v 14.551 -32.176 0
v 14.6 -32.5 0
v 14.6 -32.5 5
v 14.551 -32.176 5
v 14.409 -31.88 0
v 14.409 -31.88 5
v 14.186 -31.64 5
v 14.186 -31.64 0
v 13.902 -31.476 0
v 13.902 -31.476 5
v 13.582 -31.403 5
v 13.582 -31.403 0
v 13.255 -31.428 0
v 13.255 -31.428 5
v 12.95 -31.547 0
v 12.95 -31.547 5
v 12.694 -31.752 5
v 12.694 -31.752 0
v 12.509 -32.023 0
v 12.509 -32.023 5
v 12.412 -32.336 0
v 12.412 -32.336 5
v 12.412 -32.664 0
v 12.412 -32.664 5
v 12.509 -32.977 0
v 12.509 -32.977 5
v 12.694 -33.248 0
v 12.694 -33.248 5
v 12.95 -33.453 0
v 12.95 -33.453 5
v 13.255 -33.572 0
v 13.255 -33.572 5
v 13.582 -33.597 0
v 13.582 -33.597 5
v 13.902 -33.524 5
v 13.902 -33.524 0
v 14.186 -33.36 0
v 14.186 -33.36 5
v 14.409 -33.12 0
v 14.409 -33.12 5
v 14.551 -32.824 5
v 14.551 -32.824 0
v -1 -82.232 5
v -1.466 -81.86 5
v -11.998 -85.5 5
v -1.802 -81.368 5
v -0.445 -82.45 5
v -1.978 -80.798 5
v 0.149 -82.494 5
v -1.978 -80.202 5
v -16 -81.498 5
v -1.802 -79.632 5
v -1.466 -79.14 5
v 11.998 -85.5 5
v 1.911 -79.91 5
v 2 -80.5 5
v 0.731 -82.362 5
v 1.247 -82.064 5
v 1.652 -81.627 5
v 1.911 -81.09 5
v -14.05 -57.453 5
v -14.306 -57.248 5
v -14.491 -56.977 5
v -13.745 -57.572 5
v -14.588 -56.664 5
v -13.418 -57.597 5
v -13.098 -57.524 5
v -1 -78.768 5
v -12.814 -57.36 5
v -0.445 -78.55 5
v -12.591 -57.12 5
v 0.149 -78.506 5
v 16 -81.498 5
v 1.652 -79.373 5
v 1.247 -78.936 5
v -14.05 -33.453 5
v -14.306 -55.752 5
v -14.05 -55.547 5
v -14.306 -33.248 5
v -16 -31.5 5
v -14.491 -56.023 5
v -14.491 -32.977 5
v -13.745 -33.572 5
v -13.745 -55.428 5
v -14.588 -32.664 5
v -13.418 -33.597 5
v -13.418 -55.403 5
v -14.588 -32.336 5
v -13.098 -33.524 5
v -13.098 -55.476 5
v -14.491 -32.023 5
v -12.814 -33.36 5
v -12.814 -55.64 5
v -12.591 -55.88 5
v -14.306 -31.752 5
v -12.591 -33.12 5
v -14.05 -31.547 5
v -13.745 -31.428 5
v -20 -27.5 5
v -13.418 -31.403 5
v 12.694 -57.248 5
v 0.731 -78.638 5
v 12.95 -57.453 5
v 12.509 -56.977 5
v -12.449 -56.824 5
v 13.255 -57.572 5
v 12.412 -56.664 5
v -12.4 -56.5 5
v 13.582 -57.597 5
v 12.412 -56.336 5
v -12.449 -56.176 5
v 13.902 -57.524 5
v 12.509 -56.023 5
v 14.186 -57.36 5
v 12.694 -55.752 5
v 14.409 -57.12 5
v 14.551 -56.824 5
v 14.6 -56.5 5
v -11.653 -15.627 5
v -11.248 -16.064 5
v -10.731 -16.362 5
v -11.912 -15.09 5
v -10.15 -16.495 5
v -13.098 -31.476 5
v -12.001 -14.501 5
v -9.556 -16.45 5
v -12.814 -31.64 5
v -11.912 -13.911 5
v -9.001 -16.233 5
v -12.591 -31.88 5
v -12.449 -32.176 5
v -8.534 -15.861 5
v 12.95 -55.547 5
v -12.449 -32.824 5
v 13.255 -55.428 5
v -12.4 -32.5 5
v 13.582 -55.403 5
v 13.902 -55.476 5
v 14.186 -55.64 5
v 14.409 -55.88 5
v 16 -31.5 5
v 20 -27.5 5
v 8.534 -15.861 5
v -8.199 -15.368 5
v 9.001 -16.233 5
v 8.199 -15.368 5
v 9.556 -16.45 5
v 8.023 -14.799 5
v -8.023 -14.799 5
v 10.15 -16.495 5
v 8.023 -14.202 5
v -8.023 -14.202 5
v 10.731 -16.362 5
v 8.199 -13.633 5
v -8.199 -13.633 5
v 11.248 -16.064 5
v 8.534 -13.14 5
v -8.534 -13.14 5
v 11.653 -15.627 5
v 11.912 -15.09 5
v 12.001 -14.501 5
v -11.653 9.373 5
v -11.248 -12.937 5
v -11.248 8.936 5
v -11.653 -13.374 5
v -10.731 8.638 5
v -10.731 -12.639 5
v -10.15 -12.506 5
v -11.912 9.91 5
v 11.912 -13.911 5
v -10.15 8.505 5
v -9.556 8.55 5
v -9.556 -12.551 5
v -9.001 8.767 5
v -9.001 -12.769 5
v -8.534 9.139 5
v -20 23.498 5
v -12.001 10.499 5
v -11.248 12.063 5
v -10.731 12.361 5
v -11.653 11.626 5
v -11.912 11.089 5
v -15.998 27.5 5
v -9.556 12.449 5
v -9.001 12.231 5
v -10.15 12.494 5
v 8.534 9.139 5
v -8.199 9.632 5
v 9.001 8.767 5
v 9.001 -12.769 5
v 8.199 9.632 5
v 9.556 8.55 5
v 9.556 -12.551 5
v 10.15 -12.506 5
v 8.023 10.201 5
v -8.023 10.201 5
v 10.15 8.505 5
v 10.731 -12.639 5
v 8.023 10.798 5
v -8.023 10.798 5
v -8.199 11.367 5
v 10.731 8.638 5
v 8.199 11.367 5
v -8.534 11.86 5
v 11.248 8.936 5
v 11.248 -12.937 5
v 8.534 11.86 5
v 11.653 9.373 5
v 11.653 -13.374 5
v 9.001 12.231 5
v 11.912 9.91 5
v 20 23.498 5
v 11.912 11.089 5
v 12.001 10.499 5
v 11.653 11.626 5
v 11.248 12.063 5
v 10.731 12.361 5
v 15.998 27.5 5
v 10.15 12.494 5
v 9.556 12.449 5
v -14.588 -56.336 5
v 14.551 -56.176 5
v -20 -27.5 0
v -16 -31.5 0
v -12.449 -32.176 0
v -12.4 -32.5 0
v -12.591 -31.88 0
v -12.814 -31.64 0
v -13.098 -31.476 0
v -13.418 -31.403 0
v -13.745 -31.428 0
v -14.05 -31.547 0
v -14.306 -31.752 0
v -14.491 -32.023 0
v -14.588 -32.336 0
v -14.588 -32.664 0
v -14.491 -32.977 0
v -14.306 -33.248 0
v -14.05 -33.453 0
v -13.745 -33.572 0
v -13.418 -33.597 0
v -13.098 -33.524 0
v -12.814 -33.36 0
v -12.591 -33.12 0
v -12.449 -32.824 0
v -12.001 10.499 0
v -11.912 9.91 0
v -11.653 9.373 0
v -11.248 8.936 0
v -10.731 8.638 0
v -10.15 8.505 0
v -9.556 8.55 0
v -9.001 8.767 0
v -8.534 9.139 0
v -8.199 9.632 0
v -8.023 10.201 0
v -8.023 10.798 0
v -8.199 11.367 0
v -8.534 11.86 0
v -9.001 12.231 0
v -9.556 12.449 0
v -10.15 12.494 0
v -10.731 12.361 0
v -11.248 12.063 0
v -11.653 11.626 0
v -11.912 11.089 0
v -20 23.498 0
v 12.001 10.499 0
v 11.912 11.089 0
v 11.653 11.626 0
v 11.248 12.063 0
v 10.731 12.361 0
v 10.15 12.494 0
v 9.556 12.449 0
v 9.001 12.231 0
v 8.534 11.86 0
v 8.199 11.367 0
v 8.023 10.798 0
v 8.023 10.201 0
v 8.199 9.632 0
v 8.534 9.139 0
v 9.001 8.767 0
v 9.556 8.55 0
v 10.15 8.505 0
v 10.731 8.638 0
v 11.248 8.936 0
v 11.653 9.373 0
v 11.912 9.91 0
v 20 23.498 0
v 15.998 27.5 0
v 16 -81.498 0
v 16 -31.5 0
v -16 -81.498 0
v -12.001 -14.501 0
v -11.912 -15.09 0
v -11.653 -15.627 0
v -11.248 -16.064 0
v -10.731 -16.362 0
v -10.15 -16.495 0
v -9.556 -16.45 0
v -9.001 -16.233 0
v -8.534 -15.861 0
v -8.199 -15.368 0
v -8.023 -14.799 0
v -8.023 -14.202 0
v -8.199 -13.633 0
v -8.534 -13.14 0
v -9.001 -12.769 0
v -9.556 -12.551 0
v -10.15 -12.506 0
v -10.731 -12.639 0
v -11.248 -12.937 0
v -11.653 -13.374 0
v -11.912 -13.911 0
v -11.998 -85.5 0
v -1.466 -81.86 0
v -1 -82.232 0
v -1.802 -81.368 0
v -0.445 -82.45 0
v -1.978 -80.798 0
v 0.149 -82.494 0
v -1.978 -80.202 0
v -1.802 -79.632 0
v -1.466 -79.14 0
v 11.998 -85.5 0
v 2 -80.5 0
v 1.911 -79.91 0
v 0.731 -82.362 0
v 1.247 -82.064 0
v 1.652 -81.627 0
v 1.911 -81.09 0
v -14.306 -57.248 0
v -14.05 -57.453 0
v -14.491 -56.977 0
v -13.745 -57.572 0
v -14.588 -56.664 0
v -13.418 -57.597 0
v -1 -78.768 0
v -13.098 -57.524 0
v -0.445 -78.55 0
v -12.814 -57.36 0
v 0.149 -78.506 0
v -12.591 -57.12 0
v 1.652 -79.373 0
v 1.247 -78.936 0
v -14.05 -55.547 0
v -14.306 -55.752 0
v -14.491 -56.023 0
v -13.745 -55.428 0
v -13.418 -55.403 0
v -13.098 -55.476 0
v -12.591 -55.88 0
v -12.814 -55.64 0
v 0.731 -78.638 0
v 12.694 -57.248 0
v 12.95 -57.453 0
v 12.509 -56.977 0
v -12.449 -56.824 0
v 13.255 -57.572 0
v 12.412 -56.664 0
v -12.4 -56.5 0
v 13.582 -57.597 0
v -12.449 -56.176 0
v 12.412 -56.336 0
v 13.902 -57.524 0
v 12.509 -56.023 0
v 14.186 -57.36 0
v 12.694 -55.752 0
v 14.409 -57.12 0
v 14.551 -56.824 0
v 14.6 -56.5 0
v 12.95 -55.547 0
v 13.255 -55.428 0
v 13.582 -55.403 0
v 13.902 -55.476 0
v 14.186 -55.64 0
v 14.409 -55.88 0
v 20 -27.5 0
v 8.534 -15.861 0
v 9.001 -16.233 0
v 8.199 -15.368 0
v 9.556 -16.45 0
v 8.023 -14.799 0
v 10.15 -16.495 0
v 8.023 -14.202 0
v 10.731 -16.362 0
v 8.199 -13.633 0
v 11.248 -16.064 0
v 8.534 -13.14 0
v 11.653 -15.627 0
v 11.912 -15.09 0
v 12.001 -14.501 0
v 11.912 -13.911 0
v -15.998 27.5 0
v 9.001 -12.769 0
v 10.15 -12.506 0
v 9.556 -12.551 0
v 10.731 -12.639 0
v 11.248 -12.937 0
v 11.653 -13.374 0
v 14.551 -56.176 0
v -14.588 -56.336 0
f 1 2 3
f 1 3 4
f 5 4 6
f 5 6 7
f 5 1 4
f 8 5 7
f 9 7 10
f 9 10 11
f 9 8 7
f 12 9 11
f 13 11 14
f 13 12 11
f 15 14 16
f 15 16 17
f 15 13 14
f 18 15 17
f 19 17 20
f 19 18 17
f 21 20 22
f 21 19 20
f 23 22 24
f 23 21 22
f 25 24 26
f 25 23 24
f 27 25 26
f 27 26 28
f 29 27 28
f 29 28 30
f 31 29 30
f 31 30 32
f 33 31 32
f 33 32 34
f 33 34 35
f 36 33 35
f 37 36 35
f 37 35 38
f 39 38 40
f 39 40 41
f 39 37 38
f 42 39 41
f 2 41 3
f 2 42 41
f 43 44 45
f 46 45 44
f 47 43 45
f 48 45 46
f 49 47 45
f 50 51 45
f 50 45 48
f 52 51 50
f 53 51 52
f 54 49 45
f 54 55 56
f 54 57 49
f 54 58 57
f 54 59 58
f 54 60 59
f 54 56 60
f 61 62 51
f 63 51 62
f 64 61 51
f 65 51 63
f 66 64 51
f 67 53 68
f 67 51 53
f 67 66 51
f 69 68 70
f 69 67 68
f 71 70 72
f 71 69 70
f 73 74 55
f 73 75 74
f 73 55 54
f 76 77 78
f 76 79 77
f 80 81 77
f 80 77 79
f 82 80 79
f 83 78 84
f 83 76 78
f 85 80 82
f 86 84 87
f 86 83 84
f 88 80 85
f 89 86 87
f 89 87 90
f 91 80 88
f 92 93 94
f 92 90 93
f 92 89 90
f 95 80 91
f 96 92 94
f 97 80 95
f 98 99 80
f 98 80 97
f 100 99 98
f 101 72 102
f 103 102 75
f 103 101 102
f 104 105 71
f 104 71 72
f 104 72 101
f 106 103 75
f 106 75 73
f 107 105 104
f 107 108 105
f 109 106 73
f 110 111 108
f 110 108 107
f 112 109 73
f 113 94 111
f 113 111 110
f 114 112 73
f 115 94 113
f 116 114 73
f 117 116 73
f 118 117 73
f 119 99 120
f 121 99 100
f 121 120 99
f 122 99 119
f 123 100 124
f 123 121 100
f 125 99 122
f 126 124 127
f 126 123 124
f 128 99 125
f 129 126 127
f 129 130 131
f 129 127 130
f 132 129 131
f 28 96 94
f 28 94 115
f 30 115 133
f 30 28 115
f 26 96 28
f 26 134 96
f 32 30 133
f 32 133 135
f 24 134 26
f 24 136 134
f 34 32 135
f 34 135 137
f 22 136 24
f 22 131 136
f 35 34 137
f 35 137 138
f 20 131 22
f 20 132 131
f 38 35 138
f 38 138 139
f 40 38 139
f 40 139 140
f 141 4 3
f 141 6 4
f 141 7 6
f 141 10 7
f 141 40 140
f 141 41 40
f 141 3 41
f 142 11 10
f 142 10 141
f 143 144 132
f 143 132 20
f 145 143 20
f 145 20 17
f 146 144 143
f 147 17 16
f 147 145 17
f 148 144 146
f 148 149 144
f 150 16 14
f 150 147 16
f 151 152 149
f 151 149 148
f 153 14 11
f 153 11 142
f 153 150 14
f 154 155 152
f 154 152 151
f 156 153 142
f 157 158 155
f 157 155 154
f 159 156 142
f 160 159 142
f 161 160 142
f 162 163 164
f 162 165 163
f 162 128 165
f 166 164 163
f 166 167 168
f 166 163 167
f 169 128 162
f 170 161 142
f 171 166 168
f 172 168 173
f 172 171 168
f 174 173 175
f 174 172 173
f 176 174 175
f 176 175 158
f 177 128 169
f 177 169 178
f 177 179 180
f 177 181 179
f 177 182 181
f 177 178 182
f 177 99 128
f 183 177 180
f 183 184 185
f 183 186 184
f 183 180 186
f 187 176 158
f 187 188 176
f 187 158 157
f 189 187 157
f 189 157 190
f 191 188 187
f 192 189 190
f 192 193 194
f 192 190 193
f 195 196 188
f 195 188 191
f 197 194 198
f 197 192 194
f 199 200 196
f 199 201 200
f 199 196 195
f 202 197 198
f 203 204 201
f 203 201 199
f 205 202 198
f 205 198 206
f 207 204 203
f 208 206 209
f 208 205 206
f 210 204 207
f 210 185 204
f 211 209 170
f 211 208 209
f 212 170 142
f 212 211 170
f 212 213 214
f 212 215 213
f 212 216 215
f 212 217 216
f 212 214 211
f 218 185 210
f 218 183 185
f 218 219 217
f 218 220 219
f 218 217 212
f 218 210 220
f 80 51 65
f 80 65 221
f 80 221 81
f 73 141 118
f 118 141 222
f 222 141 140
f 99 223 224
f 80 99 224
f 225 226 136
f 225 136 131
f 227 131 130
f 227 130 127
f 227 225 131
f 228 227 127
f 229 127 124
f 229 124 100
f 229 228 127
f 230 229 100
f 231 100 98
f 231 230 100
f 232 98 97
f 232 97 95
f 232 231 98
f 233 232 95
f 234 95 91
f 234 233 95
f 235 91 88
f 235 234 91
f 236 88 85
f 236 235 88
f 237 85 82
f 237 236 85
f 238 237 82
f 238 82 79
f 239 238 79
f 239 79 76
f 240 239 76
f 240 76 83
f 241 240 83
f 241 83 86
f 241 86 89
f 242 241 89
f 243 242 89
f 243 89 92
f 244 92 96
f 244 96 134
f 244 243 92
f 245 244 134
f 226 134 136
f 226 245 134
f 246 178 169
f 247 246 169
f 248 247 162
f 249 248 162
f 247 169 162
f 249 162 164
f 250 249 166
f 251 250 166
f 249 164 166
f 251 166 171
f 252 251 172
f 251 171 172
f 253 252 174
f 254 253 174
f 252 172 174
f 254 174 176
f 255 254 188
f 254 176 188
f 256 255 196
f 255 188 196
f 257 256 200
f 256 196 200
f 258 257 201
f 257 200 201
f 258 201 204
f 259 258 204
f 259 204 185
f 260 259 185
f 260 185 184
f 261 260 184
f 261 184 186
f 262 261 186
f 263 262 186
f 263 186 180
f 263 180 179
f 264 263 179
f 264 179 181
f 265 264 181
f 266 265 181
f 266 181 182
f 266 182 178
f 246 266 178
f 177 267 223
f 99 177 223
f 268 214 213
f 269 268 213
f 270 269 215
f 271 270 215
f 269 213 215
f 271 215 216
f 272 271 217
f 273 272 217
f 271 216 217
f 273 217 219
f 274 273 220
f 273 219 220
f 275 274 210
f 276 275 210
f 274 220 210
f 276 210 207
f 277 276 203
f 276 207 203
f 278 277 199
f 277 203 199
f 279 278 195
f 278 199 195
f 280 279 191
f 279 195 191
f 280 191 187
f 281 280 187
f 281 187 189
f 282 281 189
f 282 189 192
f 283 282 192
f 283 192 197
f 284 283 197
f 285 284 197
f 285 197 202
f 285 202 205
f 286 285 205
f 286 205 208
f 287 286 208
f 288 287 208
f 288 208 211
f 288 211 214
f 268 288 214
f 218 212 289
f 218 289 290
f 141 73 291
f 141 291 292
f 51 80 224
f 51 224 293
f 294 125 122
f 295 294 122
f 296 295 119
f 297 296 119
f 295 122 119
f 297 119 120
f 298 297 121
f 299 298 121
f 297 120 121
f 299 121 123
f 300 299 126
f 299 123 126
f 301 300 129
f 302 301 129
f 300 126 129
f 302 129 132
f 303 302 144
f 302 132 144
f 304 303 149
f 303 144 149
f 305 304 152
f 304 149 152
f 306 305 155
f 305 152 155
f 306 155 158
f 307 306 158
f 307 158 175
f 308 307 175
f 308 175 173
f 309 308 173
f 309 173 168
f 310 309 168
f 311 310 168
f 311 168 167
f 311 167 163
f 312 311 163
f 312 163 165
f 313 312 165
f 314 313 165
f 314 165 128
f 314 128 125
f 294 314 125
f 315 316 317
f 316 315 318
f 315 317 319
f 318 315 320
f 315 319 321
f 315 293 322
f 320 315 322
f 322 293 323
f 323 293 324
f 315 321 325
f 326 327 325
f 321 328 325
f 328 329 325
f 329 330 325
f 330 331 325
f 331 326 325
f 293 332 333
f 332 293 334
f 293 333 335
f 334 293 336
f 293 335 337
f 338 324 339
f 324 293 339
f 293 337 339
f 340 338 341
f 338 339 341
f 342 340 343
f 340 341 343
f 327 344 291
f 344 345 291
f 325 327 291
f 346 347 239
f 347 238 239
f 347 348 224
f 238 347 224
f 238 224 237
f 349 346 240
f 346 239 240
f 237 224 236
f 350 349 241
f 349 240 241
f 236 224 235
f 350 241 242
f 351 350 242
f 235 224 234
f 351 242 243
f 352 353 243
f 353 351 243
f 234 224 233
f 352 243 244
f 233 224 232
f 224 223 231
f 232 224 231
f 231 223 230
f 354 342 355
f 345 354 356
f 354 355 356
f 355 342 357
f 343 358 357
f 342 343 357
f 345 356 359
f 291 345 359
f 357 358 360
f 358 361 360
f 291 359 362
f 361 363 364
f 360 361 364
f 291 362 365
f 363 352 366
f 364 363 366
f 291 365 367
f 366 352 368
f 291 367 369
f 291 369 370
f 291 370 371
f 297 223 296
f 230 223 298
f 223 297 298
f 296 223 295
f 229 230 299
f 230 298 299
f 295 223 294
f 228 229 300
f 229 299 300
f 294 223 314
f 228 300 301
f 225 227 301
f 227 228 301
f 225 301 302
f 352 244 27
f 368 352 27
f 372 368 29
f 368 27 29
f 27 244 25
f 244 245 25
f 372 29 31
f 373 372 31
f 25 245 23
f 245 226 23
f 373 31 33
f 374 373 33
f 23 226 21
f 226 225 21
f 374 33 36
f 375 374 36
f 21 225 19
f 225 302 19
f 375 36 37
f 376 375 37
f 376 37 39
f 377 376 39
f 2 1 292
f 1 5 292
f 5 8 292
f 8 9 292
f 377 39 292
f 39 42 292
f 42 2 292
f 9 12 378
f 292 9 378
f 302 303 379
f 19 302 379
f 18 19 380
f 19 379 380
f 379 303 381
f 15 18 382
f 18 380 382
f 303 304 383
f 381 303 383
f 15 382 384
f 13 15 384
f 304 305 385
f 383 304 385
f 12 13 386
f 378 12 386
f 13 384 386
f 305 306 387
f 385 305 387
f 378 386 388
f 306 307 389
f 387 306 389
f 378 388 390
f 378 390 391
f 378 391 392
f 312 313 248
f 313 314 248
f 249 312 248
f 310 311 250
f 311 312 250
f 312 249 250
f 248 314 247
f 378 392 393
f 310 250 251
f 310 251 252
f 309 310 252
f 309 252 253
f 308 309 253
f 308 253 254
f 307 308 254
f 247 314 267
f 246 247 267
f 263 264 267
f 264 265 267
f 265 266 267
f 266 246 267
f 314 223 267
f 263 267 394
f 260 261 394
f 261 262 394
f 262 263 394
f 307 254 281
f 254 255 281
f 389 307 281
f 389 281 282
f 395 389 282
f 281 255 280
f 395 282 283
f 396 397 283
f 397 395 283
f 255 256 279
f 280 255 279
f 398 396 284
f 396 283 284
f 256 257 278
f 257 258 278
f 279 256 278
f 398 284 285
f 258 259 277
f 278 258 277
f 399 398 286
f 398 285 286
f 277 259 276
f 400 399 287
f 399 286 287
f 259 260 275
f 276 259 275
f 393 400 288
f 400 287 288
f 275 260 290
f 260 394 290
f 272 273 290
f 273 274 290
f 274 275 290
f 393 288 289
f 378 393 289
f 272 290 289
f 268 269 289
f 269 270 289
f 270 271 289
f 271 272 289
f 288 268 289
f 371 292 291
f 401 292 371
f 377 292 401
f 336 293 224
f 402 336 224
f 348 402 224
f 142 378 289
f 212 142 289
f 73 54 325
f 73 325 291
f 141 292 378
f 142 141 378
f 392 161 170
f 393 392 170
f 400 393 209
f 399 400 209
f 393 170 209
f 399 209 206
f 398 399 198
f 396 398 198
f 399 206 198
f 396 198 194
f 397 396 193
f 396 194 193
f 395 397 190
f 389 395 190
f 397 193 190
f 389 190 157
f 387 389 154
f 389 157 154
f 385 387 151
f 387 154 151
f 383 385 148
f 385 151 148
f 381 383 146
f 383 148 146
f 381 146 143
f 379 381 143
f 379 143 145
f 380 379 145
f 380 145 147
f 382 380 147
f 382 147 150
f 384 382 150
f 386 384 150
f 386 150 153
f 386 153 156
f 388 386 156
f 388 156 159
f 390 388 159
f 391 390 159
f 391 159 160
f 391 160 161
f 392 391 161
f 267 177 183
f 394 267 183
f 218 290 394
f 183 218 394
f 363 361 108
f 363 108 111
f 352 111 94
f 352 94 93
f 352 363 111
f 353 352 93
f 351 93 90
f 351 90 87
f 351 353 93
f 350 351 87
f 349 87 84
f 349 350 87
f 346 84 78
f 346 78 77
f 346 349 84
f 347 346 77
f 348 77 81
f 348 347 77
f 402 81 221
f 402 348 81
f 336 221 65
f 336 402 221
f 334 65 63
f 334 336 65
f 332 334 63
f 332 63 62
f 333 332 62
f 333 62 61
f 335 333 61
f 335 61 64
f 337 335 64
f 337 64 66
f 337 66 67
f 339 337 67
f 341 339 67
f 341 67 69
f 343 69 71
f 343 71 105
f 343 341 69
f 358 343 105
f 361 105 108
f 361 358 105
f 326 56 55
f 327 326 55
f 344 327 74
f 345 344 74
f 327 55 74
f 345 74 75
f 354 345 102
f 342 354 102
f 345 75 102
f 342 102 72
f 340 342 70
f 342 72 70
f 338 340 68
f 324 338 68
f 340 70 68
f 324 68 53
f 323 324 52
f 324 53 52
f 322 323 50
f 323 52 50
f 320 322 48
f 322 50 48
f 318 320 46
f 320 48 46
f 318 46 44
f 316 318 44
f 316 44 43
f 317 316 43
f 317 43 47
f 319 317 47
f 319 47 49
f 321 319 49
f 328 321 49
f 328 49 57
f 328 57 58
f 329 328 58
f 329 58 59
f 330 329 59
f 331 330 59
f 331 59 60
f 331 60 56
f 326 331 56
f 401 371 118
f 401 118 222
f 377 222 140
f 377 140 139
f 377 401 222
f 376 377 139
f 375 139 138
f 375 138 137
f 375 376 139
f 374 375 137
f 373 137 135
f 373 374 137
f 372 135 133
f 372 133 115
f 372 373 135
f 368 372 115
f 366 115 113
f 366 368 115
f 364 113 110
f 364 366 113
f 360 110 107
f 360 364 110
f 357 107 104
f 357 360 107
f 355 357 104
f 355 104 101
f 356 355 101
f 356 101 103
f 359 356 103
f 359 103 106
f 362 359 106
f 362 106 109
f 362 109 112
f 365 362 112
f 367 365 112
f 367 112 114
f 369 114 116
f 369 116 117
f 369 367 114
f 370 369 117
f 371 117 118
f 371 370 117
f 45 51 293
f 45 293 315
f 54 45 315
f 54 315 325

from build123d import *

# Parameters (mm, degrees)
CROQUIS1_R              = 1.1
FORMABASE_DEPTH         = 5
ESQUINAS_DEPTH          = 65.863317831
CROQUIS3_R              = 2
BARRENOSEJEZ_DEPTH      = 65.863317831
SALIENTE_EXTRUIR2_DEPTH = 5
CROQUIS5_R              = 2
CORTAR_EXTRUIR9_DEPTH   = 88.950270039


with BuildPart() as part:
    # Croquis1 → FormaBase (new body)
    with BuildSketch(Plane.XY):
        Polygon((20, 27.5), (-20, 27.5), (-20, -27.5), (-16, -31.5), (-16, -61.5), (16, -61.5), (16, -31.5), (20, -27.5), align=None)
        with Locations((-13.5, -32.5)):
            Circle(CROQUIS1_R, mode=Mode.SUBTRACT)
        with Locations((-13.5, -56.5)):
            Circle(CROQUIS1_R, mode=Mode.SUBTRACT)
        with Locations((13.5, -56.5)):
            Circle(CROQUIS1_R, mode=Mode.SUBTRACT)
        with Locations((13.5, -32.5)):
            Circle(CROQUIS1_R, mode=Mode.SUBTRACT)
    extrude(amount=FORMABASE_DEPTH)

    # Croquis2 → Esquinas (cut, through all)
    with BuildSketch(Plane.XY.offset(5)):
        Polygon((-20, 27.5), (-20, 23.497775618), (-15.997775618, 27.5), align=None)
        Polygon((20, 23.497775618), (15.997775618, 27.5), (20, 27.5), align=None)
    extrude(amount=-ESQUINAS_DEPTH, mode=Mode.SUBTRACT)

    # Croquis3 → BarrenosEjeZ (cut, through all)
    with BuildSketch(Plane.XY.offset(5)):
        with Locations((10.000556095, 10.499443905)):
            Circle(CROQUIS3_R)
        with Locations((10.000556095, -14.500556095)):
            Circle(CROQUIS3_R)
        with Locations(Location((-10.000556095, 10.499443905, 0), (0, 0, 180))):
            Circle(CROQUIS3_R)
        with Locations(Location((-10.000556095, -14.500556095, 0), (0, 0, 180))):
            Circle(CROQUIS3_R)
    extrude(amount=-BARRENOSEJEZ_DEPTH, mode=Mode.SUBTRACT)

    # Croquis4 → Saliente-Extruir2 (add, through all)
    with BuildSketch(Plane.XY.offset(5)):
        Polygon((-16, -61.5), (-16, -81.497775618), (-11.997775618, -85.5), (0, -85.5), (0, -61.5), align=None)
        Polygon((0, -61.5), (0, -85.5), (11.997775618, -85.5), (16, -81.497775618), (16, -61.5), align=None)
    extrude(amount=-SALIENTE_EXTRUIR2_DEPTH)

    # Croquis5 → Cortar-Extruir9 (cut, through all)
    with BuildSketch(Plane.XY.offset(5)):
        with Locations((0, -80.5)):
            Circle(CROQUIS5_R)
    extrude(amount=-CORTAR_EXTRUIR9_DEPTH, mode=Mode.SUBTRACT)


solid = part.part
